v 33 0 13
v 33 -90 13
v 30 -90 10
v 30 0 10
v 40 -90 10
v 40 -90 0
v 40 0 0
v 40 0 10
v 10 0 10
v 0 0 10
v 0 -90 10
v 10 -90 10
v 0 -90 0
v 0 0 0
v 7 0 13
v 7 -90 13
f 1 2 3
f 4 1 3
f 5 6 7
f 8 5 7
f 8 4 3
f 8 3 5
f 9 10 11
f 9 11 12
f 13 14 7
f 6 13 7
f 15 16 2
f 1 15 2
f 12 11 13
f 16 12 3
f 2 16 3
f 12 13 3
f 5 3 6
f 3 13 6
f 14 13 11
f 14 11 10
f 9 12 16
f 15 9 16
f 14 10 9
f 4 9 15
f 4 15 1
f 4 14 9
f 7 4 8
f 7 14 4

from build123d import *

# Parameters (mm, degrees)
SKETCH_1_W      = 40
SKETCH_1_H      = 90
EXTRUDE_1_DEPTH = 10
EXTRUDE_2_DEPTH = 90


with BuildPart() as part:
    # 草图1 → 凸台-拉伸1 (new body)
    with BuildSketch(Plane.XY):
        with Locations((20, -45)):
            Rectangle(SKETCH_1_W, SKETCH_1_H)
    extrude(amount=EXTRUDE_1_DEPTH)

    # 草图2 → 凸台-拉伸2 (add)
    with BuildSketch(Plane.XZ.offset(90)):
        Polygon((10, 10), (7, 13), (33, 13), (30, 10), align=None)
    extrude(amount=-EXTRUDE_2_DEPTH)


solid = part.part
